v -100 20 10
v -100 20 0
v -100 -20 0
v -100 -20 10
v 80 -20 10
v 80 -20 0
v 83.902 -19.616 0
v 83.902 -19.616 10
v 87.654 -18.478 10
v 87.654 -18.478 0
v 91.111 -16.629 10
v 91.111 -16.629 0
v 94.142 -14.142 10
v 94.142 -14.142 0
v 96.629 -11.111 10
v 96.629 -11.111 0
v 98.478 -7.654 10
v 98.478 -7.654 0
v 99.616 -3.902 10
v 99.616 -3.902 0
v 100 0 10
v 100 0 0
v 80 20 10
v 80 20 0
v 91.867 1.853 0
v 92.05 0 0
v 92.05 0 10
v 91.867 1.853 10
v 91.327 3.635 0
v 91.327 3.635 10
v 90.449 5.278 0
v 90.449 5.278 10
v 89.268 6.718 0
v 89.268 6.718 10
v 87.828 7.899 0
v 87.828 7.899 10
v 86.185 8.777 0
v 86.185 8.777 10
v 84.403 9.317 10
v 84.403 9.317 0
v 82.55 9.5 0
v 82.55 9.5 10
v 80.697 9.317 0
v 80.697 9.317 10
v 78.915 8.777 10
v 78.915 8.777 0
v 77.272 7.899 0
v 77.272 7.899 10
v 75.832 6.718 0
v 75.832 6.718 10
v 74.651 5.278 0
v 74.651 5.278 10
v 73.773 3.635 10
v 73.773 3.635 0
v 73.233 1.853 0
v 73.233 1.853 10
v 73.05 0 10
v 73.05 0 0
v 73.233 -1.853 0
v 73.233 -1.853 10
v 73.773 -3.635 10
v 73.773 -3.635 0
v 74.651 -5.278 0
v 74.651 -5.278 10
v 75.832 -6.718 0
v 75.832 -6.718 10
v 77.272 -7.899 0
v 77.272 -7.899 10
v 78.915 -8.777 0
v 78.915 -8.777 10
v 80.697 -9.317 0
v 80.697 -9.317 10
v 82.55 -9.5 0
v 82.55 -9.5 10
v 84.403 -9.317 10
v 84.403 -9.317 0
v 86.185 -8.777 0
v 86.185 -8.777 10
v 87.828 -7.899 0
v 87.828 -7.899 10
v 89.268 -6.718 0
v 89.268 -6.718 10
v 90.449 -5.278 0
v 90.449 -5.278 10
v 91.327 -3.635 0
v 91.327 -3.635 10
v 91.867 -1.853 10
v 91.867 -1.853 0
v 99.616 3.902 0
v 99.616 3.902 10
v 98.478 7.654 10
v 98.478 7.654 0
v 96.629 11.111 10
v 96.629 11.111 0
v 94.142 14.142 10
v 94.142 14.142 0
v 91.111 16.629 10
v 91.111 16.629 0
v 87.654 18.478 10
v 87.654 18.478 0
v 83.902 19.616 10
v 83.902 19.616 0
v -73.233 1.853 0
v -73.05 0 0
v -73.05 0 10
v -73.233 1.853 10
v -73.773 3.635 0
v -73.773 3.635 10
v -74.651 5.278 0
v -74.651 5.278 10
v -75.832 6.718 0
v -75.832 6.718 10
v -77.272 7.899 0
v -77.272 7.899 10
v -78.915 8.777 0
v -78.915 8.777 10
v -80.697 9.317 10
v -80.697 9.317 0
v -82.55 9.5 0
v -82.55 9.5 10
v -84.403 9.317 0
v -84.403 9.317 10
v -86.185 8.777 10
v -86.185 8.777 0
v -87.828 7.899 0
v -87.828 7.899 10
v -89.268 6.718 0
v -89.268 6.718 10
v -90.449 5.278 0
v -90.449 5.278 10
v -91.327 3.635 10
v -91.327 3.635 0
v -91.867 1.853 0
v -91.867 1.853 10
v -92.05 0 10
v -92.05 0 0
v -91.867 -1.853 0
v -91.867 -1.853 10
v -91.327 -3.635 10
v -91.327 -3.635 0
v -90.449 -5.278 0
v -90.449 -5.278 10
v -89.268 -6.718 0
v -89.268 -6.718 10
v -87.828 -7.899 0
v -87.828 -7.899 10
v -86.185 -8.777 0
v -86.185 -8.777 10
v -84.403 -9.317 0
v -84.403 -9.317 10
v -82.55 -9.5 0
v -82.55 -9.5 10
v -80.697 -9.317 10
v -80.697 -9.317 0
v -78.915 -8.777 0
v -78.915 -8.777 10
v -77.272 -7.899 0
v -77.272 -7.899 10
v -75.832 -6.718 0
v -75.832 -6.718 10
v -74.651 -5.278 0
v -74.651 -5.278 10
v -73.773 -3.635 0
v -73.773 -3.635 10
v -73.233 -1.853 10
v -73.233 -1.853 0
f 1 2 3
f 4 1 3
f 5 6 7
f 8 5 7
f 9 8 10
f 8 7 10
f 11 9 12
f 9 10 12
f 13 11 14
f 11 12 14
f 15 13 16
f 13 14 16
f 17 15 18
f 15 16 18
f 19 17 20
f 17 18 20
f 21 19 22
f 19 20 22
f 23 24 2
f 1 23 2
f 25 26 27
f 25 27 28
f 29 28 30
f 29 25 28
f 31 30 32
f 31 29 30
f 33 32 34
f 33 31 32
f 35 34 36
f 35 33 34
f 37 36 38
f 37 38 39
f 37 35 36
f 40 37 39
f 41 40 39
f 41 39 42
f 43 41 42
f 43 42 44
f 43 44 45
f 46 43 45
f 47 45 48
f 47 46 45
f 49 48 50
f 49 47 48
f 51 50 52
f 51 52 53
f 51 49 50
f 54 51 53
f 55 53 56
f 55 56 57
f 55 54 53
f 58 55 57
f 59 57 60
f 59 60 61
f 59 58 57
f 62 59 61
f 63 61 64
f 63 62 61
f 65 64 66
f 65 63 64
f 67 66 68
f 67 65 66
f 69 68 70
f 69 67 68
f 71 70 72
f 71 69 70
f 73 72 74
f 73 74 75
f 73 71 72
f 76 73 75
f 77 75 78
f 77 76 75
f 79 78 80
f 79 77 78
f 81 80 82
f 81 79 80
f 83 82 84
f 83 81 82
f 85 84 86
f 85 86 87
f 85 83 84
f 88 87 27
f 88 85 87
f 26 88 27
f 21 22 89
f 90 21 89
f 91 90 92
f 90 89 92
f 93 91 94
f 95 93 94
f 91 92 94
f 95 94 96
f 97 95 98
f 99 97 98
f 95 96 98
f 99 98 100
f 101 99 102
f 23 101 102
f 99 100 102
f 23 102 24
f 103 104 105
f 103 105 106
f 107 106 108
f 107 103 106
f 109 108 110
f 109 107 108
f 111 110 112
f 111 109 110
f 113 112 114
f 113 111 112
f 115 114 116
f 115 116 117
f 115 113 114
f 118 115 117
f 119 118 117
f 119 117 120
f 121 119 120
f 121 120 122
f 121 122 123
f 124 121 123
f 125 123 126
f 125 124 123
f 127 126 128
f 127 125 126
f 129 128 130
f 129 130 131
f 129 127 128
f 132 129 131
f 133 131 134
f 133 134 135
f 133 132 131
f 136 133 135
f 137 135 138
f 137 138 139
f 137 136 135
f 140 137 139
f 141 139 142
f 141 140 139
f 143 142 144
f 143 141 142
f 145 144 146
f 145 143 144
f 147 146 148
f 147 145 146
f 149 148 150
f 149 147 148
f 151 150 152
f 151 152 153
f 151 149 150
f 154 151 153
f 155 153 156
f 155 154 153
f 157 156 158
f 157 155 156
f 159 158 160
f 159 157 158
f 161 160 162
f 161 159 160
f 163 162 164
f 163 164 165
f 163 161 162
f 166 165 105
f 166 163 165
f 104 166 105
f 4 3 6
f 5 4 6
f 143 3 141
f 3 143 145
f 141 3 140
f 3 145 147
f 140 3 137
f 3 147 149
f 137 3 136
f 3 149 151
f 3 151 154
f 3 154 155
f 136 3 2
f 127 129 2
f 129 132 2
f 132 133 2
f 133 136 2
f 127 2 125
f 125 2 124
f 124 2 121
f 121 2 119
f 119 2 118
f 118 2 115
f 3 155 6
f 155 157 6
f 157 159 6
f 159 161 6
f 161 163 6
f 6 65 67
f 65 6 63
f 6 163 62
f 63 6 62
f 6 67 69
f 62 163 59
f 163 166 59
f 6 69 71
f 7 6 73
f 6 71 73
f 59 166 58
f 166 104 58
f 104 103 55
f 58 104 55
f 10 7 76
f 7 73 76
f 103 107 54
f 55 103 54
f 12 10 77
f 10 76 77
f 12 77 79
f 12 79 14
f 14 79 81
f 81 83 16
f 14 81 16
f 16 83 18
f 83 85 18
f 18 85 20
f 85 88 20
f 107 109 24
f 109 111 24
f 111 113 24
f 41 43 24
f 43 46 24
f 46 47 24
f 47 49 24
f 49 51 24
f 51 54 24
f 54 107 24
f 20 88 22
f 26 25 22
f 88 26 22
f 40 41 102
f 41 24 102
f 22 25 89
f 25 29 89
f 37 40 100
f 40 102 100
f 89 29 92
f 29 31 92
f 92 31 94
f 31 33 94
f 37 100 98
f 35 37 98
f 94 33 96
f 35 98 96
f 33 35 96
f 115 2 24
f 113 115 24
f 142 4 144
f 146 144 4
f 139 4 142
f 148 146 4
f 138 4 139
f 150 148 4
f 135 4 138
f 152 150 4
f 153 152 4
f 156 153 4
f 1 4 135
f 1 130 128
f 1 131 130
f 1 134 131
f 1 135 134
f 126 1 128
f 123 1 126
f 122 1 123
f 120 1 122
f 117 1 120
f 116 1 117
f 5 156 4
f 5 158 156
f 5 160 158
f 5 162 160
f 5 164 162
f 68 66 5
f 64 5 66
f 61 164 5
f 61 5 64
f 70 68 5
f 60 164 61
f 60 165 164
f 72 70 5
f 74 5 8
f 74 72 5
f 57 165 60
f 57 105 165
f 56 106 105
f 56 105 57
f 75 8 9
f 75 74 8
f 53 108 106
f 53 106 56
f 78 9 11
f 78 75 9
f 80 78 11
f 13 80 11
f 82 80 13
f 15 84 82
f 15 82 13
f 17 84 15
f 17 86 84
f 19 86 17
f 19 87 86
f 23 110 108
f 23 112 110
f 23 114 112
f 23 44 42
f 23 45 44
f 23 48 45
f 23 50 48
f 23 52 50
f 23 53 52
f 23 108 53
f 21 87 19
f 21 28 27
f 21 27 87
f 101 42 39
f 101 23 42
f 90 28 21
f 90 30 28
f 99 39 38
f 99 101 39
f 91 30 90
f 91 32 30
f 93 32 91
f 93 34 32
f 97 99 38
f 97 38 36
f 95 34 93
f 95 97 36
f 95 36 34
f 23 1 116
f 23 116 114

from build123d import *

# Parameters (mm, degrees)
F0_R     = 9.5
F1_DEPTH = 10


with BuildPart() as f1:
    # F0 (on Top) → F1 (new body)
    with BuildSketch(Plane.XY):
        with BuildLine():
            Line((-100, -20), (80, -20))
            ThreePointArc((80, -20), (94.142136, -14.142136), (100, 0))
            ThreePointArc((100, 0), (94.142136, 14.142136), (80, 20))
            Line((80, 20), (-100, 20))
            Line((-100, 20), (-100, -20))
        make_face()
        with Locations((-82.55, 0)):
            Circle(F0_R, mode=Mode.SUBTRACT)
        with Locations((82.55, 0)):
            Circle(F0_R, mode=Mode.SUBTRACT)
    extrude(amount=F1_DEPTH)


solid = f1.part
